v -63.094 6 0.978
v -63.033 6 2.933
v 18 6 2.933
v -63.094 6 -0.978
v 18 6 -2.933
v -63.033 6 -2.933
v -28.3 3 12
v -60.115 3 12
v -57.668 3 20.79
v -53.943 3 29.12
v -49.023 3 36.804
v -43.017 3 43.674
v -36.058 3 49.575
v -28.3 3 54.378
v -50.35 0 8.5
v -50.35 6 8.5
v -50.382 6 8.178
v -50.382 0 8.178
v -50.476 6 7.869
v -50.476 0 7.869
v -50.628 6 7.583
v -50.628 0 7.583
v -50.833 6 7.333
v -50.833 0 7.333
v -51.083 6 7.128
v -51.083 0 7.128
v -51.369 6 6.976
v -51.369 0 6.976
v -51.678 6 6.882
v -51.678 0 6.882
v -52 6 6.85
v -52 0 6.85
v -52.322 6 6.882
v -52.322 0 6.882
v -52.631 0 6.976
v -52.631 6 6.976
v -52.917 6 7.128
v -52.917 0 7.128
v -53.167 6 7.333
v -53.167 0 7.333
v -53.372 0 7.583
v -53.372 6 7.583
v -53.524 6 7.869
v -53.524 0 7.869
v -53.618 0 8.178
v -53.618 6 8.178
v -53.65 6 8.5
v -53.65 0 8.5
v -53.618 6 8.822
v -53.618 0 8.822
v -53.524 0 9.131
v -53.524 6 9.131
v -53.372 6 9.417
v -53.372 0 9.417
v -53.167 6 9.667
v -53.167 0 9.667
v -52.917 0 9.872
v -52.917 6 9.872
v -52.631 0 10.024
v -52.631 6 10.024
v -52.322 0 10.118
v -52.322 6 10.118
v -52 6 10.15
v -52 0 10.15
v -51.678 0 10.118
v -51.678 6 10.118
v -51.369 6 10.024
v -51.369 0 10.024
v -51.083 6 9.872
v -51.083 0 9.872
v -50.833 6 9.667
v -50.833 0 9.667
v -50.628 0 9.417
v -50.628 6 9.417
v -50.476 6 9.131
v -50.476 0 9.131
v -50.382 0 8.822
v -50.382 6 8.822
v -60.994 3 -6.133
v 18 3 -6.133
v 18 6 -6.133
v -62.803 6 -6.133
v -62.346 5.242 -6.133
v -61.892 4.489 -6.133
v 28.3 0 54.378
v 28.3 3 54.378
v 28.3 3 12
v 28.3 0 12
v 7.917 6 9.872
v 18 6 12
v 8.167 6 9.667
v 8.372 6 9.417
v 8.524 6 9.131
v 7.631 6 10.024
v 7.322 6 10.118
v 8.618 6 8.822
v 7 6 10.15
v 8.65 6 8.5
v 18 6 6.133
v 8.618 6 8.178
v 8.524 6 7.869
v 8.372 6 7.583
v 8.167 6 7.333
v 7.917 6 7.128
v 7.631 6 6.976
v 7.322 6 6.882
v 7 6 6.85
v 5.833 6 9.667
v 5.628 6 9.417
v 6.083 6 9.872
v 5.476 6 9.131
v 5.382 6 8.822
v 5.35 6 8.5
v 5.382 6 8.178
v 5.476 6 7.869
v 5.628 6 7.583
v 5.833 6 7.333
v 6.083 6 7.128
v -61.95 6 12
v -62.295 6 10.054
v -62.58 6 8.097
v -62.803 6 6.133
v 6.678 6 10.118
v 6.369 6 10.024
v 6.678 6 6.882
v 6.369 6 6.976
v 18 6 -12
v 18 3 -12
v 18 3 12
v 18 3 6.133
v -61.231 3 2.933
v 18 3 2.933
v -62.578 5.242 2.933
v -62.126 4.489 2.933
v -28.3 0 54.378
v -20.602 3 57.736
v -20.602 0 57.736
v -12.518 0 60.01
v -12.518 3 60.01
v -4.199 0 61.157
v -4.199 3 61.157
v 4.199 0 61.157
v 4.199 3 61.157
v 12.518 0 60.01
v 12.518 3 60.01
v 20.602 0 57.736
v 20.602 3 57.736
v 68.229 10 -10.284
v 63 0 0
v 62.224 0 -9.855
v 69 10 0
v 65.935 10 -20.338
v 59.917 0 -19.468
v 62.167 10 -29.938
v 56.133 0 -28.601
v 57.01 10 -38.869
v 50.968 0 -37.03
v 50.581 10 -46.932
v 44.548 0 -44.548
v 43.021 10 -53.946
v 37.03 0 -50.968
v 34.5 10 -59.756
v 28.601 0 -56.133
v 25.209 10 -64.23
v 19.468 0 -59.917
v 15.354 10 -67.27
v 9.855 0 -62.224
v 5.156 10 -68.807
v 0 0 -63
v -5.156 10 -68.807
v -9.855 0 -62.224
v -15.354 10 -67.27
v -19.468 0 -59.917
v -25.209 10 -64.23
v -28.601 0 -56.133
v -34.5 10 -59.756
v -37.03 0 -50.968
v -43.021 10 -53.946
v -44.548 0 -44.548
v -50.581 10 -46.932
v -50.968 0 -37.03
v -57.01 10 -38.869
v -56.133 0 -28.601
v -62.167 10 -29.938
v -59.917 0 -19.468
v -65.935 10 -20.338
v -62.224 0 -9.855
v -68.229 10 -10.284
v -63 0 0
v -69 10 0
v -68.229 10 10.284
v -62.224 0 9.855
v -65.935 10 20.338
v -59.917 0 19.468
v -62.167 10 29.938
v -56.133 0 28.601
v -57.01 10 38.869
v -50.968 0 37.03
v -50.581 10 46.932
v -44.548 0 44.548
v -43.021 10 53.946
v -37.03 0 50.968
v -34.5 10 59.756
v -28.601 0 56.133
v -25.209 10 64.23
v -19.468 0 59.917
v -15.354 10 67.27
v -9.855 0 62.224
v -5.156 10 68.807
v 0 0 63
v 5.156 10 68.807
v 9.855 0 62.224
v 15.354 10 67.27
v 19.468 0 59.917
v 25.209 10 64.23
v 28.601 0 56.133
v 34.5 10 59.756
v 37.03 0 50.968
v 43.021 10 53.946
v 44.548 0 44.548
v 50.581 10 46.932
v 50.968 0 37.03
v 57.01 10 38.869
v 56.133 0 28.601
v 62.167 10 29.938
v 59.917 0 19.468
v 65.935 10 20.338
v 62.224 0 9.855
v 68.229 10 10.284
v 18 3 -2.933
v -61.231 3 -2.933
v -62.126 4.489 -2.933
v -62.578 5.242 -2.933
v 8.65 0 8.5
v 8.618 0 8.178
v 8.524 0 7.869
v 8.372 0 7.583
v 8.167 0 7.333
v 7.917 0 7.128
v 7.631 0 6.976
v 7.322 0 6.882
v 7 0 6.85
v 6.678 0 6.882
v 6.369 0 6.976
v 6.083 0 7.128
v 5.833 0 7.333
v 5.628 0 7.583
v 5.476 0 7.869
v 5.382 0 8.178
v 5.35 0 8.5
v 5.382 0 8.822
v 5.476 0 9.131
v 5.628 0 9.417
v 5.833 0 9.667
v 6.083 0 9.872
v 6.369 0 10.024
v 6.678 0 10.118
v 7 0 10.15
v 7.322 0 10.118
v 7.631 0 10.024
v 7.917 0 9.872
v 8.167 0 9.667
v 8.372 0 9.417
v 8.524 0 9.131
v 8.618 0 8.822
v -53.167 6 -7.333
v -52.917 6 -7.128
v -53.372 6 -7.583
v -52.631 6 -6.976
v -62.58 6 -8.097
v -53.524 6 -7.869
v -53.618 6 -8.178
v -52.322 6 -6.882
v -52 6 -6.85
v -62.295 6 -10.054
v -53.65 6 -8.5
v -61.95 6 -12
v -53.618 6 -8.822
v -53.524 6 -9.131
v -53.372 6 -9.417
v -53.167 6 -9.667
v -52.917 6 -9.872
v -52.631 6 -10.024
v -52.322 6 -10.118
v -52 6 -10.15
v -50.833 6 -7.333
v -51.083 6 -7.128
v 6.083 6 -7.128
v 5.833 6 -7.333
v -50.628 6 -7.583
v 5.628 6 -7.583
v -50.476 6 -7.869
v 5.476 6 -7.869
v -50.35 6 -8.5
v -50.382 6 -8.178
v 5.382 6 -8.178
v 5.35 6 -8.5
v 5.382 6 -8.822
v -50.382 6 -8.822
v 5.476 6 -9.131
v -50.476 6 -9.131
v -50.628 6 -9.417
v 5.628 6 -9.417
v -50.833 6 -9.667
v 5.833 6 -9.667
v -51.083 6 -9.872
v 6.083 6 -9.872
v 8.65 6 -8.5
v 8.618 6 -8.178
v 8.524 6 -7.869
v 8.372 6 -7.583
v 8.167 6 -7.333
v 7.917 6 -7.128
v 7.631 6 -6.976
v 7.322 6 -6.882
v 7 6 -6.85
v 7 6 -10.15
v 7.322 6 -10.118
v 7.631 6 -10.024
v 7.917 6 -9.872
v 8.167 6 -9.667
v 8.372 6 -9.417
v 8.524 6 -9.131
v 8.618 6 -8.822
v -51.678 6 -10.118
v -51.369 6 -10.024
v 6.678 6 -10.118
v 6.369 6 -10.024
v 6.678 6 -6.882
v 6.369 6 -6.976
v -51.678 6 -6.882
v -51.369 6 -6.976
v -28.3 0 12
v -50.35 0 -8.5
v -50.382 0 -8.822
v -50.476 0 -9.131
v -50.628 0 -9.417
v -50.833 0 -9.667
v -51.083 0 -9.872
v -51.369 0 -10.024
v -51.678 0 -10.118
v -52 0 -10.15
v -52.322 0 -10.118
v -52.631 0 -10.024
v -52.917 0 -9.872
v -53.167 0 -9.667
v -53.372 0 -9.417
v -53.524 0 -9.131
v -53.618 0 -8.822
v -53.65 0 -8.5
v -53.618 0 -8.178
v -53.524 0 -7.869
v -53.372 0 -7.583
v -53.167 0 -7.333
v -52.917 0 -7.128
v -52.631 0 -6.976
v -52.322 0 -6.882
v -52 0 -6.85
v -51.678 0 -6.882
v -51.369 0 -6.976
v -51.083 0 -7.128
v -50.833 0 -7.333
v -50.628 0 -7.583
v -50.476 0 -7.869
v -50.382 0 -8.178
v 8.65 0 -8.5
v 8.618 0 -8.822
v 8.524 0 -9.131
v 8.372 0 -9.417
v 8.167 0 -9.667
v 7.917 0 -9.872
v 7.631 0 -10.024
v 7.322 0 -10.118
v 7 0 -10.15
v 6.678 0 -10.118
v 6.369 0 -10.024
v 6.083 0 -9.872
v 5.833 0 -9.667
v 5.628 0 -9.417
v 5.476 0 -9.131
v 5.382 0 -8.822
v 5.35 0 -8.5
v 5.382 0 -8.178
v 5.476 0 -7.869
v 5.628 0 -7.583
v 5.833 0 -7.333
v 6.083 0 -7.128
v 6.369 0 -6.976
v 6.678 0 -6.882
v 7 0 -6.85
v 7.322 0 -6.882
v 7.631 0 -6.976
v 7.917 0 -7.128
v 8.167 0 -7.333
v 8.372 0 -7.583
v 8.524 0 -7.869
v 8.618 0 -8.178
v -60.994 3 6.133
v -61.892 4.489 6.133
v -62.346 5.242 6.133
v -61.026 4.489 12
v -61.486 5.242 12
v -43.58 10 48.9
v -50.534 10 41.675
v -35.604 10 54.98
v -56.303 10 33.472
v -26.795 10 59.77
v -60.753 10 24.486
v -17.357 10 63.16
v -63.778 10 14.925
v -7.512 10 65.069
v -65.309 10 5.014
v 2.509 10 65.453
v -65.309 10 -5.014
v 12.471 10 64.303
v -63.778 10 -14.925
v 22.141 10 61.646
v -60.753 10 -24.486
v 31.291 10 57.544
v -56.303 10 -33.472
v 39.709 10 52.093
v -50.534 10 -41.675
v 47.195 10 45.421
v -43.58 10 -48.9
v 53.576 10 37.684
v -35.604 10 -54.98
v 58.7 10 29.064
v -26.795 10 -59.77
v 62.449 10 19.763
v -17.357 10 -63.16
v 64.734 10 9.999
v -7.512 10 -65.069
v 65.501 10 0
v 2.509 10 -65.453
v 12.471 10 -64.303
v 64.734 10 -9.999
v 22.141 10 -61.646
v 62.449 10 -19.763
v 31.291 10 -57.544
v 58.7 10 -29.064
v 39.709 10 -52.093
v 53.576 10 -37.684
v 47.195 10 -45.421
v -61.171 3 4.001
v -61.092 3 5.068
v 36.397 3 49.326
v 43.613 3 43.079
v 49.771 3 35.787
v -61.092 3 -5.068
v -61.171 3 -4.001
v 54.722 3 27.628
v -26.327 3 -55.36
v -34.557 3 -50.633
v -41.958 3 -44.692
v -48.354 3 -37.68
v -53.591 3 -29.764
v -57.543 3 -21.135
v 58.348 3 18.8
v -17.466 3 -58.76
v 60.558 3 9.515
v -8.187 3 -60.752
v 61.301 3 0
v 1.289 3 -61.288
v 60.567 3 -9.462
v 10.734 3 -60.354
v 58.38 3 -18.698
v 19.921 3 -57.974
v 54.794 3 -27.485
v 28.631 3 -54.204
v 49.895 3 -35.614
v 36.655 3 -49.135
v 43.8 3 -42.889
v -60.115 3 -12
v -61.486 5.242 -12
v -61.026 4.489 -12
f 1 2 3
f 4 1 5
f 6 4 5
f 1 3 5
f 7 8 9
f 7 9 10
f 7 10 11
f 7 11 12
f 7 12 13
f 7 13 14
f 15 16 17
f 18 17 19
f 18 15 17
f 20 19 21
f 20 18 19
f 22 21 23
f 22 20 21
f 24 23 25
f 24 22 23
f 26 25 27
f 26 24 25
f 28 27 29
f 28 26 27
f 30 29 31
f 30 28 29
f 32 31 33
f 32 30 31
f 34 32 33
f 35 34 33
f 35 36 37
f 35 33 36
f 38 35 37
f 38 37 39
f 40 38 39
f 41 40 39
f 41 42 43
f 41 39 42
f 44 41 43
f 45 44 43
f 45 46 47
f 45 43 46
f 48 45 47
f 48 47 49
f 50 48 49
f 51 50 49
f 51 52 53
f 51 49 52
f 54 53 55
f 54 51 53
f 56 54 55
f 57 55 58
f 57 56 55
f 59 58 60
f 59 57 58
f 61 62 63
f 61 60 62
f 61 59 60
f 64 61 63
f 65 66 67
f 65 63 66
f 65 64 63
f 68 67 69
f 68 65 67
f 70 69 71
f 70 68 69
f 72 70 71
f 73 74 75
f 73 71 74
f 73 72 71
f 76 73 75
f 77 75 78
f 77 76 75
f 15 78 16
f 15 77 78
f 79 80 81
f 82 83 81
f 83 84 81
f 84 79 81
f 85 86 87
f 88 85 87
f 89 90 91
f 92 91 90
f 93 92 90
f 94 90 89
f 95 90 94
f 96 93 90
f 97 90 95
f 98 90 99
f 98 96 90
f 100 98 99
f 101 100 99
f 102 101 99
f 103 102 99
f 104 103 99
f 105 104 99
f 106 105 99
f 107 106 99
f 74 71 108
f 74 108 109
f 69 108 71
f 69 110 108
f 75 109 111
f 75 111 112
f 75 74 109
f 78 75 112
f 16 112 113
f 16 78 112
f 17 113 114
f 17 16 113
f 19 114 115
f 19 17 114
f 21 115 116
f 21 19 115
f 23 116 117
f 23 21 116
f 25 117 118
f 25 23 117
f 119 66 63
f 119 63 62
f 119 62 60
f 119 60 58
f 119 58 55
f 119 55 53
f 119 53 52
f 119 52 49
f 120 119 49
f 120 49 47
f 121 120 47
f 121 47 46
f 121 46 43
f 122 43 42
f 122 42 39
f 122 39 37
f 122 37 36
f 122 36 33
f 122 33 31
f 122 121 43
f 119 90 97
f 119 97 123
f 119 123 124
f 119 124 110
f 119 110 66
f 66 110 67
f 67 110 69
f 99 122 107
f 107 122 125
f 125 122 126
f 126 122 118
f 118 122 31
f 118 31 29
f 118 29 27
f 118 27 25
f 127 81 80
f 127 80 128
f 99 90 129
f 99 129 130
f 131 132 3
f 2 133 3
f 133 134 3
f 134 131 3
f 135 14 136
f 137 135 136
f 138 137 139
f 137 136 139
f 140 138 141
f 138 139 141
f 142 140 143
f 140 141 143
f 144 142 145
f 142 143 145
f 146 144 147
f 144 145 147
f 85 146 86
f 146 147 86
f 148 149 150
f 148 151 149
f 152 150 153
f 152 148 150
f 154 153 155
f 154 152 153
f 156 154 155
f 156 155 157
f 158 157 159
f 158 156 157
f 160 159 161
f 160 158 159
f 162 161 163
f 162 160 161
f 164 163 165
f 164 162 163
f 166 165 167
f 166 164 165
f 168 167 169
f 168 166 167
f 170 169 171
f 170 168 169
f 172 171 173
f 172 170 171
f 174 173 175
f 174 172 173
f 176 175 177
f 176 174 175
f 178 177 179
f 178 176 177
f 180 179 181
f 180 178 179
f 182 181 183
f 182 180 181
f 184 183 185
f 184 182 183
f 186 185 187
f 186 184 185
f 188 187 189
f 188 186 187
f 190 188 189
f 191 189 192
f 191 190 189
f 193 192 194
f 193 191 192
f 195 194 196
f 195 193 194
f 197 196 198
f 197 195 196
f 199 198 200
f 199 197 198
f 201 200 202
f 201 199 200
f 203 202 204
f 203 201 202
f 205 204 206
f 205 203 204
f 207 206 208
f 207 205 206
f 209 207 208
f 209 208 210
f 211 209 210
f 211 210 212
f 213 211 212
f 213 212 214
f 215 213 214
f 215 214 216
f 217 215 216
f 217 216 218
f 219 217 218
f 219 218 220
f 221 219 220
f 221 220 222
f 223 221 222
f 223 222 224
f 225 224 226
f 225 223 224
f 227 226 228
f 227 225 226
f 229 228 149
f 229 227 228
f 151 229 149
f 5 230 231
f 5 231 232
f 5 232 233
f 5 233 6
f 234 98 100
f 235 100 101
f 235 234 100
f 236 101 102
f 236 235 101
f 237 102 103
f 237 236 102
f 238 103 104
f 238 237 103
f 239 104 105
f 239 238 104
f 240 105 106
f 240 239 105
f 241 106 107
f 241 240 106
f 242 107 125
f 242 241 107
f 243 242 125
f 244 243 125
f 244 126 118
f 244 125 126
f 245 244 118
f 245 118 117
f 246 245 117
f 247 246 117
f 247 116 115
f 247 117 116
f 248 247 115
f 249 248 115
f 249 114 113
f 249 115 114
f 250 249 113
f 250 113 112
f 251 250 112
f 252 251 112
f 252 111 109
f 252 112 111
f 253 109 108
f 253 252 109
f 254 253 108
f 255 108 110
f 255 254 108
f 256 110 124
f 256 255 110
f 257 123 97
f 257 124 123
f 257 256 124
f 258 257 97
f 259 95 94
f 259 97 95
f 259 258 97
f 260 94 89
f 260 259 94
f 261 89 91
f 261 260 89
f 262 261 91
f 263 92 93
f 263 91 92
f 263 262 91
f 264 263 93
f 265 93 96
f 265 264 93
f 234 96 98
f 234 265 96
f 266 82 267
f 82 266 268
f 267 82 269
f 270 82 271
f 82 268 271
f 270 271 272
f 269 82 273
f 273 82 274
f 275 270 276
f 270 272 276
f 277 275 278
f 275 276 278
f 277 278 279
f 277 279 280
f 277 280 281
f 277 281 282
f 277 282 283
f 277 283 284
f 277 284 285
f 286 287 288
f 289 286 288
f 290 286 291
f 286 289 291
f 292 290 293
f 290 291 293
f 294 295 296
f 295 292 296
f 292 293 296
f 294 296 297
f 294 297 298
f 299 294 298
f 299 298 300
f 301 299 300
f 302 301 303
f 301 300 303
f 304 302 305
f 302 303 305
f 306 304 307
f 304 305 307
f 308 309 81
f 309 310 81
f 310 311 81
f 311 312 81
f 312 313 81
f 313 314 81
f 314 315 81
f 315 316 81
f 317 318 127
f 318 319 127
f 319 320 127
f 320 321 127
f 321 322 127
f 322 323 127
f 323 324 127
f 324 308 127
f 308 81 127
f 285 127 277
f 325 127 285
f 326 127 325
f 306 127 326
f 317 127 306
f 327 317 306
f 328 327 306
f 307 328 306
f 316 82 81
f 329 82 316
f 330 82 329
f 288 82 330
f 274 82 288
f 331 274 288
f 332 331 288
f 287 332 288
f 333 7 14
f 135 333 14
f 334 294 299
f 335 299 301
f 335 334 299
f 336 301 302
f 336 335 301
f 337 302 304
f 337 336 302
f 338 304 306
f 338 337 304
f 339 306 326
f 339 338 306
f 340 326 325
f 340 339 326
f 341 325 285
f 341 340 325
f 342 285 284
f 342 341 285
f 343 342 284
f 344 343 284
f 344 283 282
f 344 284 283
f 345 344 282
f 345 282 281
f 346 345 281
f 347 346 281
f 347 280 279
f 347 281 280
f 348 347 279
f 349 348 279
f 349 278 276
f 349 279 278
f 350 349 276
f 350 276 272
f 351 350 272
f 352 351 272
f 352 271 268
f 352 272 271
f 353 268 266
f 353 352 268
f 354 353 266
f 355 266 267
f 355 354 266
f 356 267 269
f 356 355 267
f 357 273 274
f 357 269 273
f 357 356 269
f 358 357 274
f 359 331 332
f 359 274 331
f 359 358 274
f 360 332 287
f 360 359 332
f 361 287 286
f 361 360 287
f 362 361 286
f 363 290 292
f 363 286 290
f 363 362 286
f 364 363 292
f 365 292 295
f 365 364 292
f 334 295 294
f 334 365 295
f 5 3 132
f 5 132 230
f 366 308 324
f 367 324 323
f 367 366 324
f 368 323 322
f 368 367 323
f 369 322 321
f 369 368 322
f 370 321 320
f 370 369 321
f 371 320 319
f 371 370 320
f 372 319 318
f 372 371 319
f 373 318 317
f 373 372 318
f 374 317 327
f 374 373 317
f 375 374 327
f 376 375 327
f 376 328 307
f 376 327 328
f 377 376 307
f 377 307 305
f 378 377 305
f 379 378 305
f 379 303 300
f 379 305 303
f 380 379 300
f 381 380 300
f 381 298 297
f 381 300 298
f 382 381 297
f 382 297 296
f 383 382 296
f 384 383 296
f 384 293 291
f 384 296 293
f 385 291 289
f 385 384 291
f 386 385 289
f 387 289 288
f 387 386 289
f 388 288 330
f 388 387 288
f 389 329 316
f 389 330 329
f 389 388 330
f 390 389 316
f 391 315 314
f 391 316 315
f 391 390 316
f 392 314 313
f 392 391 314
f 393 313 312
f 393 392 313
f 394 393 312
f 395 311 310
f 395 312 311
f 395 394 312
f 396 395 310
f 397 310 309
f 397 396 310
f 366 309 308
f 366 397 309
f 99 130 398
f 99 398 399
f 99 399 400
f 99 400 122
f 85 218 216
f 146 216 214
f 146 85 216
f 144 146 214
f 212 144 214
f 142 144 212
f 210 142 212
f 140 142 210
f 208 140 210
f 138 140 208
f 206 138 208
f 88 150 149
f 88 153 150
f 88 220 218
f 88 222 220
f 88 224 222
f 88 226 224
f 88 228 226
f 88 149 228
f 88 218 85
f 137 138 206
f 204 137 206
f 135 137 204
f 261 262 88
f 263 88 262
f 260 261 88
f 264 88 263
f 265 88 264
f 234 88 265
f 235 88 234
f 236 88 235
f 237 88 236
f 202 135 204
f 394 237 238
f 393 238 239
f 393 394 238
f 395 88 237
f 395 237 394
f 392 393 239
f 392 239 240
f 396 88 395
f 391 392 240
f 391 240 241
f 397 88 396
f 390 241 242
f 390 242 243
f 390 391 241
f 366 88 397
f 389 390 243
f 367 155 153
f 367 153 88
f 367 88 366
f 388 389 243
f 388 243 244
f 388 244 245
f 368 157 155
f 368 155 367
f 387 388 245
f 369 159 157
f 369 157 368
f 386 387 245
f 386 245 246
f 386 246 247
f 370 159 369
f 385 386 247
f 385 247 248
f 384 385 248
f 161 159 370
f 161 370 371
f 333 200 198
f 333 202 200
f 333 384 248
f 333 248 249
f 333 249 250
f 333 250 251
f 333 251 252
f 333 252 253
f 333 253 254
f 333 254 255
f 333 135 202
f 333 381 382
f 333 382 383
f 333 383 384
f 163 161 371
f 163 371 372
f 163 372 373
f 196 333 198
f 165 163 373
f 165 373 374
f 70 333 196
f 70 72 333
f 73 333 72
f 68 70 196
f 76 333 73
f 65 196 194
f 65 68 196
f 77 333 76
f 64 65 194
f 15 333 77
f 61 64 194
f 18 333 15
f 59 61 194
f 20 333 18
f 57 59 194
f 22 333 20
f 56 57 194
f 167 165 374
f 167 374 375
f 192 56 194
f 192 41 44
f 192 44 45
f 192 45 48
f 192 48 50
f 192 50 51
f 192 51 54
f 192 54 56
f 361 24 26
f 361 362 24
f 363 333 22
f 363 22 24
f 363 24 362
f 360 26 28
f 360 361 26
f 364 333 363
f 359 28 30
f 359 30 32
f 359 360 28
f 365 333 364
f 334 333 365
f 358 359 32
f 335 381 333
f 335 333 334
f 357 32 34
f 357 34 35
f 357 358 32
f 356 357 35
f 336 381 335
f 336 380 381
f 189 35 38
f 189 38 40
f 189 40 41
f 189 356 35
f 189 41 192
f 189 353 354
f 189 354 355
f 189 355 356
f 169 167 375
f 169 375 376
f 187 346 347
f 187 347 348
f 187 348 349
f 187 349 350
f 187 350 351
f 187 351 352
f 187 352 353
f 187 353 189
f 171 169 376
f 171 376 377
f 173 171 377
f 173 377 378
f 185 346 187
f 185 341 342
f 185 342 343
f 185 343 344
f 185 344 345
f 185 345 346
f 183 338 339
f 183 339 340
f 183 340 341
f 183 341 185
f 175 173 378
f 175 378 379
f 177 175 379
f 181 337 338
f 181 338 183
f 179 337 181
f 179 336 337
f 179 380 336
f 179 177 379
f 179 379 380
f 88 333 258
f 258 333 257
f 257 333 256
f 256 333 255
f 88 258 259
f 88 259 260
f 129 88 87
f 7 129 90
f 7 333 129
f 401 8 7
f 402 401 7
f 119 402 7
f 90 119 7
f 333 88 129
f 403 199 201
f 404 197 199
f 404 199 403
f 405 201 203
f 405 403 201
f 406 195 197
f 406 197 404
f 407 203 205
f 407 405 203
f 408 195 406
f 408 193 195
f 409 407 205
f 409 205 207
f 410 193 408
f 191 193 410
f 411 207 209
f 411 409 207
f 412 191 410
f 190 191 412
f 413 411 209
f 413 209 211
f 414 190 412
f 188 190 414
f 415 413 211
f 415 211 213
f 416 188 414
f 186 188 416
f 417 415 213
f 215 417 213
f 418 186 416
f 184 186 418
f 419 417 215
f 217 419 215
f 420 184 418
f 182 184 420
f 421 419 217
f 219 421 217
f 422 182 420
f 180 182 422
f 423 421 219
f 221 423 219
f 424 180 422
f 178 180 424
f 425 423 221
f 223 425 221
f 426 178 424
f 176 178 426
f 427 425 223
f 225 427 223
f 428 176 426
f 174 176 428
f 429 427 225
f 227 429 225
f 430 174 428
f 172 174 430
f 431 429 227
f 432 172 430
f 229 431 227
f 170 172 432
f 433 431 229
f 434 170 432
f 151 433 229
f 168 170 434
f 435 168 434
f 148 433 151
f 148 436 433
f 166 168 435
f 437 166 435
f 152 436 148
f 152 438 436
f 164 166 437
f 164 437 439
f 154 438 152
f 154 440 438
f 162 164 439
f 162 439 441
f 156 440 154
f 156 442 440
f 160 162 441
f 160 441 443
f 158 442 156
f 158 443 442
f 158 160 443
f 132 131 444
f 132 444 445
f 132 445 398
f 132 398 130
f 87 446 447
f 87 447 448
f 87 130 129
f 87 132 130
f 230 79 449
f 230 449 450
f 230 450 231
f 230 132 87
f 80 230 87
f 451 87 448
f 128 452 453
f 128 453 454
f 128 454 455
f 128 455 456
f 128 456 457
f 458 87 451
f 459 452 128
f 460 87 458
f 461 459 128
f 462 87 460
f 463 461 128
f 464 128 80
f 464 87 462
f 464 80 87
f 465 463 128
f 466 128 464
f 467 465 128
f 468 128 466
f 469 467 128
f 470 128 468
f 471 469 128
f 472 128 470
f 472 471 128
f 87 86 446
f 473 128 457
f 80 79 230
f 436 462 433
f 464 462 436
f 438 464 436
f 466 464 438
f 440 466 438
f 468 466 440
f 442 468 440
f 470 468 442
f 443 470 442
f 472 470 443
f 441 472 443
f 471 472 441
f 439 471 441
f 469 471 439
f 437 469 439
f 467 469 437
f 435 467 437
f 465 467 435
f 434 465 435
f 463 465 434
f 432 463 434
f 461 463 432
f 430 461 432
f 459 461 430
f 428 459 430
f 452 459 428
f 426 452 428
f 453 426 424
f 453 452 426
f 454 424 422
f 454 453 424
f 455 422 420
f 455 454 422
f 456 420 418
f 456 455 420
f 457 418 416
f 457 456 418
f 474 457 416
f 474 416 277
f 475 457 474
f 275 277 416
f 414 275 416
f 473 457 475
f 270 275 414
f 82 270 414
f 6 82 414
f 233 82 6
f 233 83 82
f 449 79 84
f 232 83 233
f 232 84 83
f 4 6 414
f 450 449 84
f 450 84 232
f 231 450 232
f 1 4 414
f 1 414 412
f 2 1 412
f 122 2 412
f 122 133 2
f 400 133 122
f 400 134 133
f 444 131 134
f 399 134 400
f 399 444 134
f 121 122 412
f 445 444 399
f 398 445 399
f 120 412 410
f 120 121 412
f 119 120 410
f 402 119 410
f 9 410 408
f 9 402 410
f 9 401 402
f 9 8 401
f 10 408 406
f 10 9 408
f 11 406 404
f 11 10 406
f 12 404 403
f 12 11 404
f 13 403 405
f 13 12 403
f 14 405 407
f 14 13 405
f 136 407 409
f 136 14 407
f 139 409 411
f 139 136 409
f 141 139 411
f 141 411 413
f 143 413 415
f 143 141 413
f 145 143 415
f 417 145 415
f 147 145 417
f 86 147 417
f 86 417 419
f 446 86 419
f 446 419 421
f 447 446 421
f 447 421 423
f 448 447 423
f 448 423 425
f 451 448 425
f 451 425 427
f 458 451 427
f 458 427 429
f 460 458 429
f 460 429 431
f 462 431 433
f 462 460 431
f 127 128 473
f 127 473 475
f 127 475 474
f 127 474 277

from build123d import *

# Parameters (mm, degrees)
CUT_EXTRUDE1_DEPTH       = 4
SKETCH4_W                = 5.866666667
SKETCH4_H                = 3
SKETCH4_W_2              = 5.866666666
BOSS_EXTRUDE1_DEPTH      = 10
BOSS_EXTRUDE1_DEPTH_BACK = 63.5
SKETCH5_R                = 1.65
CUT_EXTRUDE2_DEPTH       = 11
SKETCH8_W                = 5.866666667
SKETCH8_H                = 3
SKETCH8_W_2              = 5.866666666
BOSS_EXTRUDE3_DEPTH      = 8


with BuildPart() as part:
    # Sketch1 → Revolve1 (revolve)
    with BuildSketch(Plane.XY):
        Polygon((0, 0), (63, 0), (69, 10), (65.501428863, 10), (61.301428863, 3), (0, 3), align=None)
    revolve(axis=Axis((0, 0, 0), (0, 1, 0)))

    # Sketch2 → Cut-Extrude1 (cut, through all)
    with BuildSketch(Plane(origin=(0, 3, 0), x_dir=(1, 0, 0), z_dir=(0, 1, 0))):
        with BuildLine():
            Line((-28.3, -12), (-28.3, -54.378076287))
            ThreePointArc((-28.3, -54.378076287), (0, -61.301428863), (28.3, -54.378076287))
            Line((28.3, -54.378076287), (28.3, -12))
            Line((28.3, -12), (-28.3, -12))
        make_face()
    extrude(amount=-CUT_EXTRUDE1_DEPTH, mode=Mode.SUBTRACT)

    # Sketch4 → Boss-Extrude1 (add, two sides)
    with BuildSketch(Plane(origin=(0, 0, 0), x_dir=(0, 0, -1), z_dir=(1, 0, 0))) as boss_extrude1_sk:
        with Locations((-9.066666666, 4.5)):
            Rectangle(SKETCH4_W, SKETCH4_H)
        with Locations((0, 4.5)):
            Rectangle(SKETCH4_W_2, SKETCH4_H)
        with Locations((9.066666666, 4.5)):
            Rectangle(SKETCH4_W, SKETCH4_H)
    extrude(amount=BOSS_EXTRUDE1_DEPTH)
    extrude(boss_extrude1_sk.sketch, amount=-BOSS_EXTRUDE1_DEPTH_BACK)

    # Sketch5 → Cut-Extrude2 (cut, through all)
    with BuildSketch(Plane(origin=(0, 0, 0), x_dir=(1, 0, 0), z_dir=(0, 1, 0))):
        with Locations((7, -8.5)):
            Circle(SKETCH5_R)
        with Locations((7, 8.5)):
            Circle(SKETCH5_R)
        with Locations((-52, 8.5)):
            Circle(SKETCH5_R)
        with Locations((-52, -8.5)):
            Circle(SKETCH5_R)
    extrude(amount=CUT_EXTRUDE2_DEPTH, mode=Mode.SUBTRACT)

    # Sketch8 → Boss-Extrude3 (add)
    with BuildSketch(Plane(origin=(10, 0, 0), x_dir=(0, 0, -1), z_dir=(1, 0, 0))):
        with Locations((-9.066666666, 4.5)):
            Rectangle(SKETCH8_W, SKETCH8_H)
        with Locations((0, 4.5)):
            Rectangle(SKETCH8_W_2, SKETCH8_H)
        with Locations((9.066666666, 4.5)):
            Rectangle(SKETCH8_W, SKETCH8_H)
    extrude(amount=BOSS_EXTRUDE3_DEPTH)


solid = part.part
